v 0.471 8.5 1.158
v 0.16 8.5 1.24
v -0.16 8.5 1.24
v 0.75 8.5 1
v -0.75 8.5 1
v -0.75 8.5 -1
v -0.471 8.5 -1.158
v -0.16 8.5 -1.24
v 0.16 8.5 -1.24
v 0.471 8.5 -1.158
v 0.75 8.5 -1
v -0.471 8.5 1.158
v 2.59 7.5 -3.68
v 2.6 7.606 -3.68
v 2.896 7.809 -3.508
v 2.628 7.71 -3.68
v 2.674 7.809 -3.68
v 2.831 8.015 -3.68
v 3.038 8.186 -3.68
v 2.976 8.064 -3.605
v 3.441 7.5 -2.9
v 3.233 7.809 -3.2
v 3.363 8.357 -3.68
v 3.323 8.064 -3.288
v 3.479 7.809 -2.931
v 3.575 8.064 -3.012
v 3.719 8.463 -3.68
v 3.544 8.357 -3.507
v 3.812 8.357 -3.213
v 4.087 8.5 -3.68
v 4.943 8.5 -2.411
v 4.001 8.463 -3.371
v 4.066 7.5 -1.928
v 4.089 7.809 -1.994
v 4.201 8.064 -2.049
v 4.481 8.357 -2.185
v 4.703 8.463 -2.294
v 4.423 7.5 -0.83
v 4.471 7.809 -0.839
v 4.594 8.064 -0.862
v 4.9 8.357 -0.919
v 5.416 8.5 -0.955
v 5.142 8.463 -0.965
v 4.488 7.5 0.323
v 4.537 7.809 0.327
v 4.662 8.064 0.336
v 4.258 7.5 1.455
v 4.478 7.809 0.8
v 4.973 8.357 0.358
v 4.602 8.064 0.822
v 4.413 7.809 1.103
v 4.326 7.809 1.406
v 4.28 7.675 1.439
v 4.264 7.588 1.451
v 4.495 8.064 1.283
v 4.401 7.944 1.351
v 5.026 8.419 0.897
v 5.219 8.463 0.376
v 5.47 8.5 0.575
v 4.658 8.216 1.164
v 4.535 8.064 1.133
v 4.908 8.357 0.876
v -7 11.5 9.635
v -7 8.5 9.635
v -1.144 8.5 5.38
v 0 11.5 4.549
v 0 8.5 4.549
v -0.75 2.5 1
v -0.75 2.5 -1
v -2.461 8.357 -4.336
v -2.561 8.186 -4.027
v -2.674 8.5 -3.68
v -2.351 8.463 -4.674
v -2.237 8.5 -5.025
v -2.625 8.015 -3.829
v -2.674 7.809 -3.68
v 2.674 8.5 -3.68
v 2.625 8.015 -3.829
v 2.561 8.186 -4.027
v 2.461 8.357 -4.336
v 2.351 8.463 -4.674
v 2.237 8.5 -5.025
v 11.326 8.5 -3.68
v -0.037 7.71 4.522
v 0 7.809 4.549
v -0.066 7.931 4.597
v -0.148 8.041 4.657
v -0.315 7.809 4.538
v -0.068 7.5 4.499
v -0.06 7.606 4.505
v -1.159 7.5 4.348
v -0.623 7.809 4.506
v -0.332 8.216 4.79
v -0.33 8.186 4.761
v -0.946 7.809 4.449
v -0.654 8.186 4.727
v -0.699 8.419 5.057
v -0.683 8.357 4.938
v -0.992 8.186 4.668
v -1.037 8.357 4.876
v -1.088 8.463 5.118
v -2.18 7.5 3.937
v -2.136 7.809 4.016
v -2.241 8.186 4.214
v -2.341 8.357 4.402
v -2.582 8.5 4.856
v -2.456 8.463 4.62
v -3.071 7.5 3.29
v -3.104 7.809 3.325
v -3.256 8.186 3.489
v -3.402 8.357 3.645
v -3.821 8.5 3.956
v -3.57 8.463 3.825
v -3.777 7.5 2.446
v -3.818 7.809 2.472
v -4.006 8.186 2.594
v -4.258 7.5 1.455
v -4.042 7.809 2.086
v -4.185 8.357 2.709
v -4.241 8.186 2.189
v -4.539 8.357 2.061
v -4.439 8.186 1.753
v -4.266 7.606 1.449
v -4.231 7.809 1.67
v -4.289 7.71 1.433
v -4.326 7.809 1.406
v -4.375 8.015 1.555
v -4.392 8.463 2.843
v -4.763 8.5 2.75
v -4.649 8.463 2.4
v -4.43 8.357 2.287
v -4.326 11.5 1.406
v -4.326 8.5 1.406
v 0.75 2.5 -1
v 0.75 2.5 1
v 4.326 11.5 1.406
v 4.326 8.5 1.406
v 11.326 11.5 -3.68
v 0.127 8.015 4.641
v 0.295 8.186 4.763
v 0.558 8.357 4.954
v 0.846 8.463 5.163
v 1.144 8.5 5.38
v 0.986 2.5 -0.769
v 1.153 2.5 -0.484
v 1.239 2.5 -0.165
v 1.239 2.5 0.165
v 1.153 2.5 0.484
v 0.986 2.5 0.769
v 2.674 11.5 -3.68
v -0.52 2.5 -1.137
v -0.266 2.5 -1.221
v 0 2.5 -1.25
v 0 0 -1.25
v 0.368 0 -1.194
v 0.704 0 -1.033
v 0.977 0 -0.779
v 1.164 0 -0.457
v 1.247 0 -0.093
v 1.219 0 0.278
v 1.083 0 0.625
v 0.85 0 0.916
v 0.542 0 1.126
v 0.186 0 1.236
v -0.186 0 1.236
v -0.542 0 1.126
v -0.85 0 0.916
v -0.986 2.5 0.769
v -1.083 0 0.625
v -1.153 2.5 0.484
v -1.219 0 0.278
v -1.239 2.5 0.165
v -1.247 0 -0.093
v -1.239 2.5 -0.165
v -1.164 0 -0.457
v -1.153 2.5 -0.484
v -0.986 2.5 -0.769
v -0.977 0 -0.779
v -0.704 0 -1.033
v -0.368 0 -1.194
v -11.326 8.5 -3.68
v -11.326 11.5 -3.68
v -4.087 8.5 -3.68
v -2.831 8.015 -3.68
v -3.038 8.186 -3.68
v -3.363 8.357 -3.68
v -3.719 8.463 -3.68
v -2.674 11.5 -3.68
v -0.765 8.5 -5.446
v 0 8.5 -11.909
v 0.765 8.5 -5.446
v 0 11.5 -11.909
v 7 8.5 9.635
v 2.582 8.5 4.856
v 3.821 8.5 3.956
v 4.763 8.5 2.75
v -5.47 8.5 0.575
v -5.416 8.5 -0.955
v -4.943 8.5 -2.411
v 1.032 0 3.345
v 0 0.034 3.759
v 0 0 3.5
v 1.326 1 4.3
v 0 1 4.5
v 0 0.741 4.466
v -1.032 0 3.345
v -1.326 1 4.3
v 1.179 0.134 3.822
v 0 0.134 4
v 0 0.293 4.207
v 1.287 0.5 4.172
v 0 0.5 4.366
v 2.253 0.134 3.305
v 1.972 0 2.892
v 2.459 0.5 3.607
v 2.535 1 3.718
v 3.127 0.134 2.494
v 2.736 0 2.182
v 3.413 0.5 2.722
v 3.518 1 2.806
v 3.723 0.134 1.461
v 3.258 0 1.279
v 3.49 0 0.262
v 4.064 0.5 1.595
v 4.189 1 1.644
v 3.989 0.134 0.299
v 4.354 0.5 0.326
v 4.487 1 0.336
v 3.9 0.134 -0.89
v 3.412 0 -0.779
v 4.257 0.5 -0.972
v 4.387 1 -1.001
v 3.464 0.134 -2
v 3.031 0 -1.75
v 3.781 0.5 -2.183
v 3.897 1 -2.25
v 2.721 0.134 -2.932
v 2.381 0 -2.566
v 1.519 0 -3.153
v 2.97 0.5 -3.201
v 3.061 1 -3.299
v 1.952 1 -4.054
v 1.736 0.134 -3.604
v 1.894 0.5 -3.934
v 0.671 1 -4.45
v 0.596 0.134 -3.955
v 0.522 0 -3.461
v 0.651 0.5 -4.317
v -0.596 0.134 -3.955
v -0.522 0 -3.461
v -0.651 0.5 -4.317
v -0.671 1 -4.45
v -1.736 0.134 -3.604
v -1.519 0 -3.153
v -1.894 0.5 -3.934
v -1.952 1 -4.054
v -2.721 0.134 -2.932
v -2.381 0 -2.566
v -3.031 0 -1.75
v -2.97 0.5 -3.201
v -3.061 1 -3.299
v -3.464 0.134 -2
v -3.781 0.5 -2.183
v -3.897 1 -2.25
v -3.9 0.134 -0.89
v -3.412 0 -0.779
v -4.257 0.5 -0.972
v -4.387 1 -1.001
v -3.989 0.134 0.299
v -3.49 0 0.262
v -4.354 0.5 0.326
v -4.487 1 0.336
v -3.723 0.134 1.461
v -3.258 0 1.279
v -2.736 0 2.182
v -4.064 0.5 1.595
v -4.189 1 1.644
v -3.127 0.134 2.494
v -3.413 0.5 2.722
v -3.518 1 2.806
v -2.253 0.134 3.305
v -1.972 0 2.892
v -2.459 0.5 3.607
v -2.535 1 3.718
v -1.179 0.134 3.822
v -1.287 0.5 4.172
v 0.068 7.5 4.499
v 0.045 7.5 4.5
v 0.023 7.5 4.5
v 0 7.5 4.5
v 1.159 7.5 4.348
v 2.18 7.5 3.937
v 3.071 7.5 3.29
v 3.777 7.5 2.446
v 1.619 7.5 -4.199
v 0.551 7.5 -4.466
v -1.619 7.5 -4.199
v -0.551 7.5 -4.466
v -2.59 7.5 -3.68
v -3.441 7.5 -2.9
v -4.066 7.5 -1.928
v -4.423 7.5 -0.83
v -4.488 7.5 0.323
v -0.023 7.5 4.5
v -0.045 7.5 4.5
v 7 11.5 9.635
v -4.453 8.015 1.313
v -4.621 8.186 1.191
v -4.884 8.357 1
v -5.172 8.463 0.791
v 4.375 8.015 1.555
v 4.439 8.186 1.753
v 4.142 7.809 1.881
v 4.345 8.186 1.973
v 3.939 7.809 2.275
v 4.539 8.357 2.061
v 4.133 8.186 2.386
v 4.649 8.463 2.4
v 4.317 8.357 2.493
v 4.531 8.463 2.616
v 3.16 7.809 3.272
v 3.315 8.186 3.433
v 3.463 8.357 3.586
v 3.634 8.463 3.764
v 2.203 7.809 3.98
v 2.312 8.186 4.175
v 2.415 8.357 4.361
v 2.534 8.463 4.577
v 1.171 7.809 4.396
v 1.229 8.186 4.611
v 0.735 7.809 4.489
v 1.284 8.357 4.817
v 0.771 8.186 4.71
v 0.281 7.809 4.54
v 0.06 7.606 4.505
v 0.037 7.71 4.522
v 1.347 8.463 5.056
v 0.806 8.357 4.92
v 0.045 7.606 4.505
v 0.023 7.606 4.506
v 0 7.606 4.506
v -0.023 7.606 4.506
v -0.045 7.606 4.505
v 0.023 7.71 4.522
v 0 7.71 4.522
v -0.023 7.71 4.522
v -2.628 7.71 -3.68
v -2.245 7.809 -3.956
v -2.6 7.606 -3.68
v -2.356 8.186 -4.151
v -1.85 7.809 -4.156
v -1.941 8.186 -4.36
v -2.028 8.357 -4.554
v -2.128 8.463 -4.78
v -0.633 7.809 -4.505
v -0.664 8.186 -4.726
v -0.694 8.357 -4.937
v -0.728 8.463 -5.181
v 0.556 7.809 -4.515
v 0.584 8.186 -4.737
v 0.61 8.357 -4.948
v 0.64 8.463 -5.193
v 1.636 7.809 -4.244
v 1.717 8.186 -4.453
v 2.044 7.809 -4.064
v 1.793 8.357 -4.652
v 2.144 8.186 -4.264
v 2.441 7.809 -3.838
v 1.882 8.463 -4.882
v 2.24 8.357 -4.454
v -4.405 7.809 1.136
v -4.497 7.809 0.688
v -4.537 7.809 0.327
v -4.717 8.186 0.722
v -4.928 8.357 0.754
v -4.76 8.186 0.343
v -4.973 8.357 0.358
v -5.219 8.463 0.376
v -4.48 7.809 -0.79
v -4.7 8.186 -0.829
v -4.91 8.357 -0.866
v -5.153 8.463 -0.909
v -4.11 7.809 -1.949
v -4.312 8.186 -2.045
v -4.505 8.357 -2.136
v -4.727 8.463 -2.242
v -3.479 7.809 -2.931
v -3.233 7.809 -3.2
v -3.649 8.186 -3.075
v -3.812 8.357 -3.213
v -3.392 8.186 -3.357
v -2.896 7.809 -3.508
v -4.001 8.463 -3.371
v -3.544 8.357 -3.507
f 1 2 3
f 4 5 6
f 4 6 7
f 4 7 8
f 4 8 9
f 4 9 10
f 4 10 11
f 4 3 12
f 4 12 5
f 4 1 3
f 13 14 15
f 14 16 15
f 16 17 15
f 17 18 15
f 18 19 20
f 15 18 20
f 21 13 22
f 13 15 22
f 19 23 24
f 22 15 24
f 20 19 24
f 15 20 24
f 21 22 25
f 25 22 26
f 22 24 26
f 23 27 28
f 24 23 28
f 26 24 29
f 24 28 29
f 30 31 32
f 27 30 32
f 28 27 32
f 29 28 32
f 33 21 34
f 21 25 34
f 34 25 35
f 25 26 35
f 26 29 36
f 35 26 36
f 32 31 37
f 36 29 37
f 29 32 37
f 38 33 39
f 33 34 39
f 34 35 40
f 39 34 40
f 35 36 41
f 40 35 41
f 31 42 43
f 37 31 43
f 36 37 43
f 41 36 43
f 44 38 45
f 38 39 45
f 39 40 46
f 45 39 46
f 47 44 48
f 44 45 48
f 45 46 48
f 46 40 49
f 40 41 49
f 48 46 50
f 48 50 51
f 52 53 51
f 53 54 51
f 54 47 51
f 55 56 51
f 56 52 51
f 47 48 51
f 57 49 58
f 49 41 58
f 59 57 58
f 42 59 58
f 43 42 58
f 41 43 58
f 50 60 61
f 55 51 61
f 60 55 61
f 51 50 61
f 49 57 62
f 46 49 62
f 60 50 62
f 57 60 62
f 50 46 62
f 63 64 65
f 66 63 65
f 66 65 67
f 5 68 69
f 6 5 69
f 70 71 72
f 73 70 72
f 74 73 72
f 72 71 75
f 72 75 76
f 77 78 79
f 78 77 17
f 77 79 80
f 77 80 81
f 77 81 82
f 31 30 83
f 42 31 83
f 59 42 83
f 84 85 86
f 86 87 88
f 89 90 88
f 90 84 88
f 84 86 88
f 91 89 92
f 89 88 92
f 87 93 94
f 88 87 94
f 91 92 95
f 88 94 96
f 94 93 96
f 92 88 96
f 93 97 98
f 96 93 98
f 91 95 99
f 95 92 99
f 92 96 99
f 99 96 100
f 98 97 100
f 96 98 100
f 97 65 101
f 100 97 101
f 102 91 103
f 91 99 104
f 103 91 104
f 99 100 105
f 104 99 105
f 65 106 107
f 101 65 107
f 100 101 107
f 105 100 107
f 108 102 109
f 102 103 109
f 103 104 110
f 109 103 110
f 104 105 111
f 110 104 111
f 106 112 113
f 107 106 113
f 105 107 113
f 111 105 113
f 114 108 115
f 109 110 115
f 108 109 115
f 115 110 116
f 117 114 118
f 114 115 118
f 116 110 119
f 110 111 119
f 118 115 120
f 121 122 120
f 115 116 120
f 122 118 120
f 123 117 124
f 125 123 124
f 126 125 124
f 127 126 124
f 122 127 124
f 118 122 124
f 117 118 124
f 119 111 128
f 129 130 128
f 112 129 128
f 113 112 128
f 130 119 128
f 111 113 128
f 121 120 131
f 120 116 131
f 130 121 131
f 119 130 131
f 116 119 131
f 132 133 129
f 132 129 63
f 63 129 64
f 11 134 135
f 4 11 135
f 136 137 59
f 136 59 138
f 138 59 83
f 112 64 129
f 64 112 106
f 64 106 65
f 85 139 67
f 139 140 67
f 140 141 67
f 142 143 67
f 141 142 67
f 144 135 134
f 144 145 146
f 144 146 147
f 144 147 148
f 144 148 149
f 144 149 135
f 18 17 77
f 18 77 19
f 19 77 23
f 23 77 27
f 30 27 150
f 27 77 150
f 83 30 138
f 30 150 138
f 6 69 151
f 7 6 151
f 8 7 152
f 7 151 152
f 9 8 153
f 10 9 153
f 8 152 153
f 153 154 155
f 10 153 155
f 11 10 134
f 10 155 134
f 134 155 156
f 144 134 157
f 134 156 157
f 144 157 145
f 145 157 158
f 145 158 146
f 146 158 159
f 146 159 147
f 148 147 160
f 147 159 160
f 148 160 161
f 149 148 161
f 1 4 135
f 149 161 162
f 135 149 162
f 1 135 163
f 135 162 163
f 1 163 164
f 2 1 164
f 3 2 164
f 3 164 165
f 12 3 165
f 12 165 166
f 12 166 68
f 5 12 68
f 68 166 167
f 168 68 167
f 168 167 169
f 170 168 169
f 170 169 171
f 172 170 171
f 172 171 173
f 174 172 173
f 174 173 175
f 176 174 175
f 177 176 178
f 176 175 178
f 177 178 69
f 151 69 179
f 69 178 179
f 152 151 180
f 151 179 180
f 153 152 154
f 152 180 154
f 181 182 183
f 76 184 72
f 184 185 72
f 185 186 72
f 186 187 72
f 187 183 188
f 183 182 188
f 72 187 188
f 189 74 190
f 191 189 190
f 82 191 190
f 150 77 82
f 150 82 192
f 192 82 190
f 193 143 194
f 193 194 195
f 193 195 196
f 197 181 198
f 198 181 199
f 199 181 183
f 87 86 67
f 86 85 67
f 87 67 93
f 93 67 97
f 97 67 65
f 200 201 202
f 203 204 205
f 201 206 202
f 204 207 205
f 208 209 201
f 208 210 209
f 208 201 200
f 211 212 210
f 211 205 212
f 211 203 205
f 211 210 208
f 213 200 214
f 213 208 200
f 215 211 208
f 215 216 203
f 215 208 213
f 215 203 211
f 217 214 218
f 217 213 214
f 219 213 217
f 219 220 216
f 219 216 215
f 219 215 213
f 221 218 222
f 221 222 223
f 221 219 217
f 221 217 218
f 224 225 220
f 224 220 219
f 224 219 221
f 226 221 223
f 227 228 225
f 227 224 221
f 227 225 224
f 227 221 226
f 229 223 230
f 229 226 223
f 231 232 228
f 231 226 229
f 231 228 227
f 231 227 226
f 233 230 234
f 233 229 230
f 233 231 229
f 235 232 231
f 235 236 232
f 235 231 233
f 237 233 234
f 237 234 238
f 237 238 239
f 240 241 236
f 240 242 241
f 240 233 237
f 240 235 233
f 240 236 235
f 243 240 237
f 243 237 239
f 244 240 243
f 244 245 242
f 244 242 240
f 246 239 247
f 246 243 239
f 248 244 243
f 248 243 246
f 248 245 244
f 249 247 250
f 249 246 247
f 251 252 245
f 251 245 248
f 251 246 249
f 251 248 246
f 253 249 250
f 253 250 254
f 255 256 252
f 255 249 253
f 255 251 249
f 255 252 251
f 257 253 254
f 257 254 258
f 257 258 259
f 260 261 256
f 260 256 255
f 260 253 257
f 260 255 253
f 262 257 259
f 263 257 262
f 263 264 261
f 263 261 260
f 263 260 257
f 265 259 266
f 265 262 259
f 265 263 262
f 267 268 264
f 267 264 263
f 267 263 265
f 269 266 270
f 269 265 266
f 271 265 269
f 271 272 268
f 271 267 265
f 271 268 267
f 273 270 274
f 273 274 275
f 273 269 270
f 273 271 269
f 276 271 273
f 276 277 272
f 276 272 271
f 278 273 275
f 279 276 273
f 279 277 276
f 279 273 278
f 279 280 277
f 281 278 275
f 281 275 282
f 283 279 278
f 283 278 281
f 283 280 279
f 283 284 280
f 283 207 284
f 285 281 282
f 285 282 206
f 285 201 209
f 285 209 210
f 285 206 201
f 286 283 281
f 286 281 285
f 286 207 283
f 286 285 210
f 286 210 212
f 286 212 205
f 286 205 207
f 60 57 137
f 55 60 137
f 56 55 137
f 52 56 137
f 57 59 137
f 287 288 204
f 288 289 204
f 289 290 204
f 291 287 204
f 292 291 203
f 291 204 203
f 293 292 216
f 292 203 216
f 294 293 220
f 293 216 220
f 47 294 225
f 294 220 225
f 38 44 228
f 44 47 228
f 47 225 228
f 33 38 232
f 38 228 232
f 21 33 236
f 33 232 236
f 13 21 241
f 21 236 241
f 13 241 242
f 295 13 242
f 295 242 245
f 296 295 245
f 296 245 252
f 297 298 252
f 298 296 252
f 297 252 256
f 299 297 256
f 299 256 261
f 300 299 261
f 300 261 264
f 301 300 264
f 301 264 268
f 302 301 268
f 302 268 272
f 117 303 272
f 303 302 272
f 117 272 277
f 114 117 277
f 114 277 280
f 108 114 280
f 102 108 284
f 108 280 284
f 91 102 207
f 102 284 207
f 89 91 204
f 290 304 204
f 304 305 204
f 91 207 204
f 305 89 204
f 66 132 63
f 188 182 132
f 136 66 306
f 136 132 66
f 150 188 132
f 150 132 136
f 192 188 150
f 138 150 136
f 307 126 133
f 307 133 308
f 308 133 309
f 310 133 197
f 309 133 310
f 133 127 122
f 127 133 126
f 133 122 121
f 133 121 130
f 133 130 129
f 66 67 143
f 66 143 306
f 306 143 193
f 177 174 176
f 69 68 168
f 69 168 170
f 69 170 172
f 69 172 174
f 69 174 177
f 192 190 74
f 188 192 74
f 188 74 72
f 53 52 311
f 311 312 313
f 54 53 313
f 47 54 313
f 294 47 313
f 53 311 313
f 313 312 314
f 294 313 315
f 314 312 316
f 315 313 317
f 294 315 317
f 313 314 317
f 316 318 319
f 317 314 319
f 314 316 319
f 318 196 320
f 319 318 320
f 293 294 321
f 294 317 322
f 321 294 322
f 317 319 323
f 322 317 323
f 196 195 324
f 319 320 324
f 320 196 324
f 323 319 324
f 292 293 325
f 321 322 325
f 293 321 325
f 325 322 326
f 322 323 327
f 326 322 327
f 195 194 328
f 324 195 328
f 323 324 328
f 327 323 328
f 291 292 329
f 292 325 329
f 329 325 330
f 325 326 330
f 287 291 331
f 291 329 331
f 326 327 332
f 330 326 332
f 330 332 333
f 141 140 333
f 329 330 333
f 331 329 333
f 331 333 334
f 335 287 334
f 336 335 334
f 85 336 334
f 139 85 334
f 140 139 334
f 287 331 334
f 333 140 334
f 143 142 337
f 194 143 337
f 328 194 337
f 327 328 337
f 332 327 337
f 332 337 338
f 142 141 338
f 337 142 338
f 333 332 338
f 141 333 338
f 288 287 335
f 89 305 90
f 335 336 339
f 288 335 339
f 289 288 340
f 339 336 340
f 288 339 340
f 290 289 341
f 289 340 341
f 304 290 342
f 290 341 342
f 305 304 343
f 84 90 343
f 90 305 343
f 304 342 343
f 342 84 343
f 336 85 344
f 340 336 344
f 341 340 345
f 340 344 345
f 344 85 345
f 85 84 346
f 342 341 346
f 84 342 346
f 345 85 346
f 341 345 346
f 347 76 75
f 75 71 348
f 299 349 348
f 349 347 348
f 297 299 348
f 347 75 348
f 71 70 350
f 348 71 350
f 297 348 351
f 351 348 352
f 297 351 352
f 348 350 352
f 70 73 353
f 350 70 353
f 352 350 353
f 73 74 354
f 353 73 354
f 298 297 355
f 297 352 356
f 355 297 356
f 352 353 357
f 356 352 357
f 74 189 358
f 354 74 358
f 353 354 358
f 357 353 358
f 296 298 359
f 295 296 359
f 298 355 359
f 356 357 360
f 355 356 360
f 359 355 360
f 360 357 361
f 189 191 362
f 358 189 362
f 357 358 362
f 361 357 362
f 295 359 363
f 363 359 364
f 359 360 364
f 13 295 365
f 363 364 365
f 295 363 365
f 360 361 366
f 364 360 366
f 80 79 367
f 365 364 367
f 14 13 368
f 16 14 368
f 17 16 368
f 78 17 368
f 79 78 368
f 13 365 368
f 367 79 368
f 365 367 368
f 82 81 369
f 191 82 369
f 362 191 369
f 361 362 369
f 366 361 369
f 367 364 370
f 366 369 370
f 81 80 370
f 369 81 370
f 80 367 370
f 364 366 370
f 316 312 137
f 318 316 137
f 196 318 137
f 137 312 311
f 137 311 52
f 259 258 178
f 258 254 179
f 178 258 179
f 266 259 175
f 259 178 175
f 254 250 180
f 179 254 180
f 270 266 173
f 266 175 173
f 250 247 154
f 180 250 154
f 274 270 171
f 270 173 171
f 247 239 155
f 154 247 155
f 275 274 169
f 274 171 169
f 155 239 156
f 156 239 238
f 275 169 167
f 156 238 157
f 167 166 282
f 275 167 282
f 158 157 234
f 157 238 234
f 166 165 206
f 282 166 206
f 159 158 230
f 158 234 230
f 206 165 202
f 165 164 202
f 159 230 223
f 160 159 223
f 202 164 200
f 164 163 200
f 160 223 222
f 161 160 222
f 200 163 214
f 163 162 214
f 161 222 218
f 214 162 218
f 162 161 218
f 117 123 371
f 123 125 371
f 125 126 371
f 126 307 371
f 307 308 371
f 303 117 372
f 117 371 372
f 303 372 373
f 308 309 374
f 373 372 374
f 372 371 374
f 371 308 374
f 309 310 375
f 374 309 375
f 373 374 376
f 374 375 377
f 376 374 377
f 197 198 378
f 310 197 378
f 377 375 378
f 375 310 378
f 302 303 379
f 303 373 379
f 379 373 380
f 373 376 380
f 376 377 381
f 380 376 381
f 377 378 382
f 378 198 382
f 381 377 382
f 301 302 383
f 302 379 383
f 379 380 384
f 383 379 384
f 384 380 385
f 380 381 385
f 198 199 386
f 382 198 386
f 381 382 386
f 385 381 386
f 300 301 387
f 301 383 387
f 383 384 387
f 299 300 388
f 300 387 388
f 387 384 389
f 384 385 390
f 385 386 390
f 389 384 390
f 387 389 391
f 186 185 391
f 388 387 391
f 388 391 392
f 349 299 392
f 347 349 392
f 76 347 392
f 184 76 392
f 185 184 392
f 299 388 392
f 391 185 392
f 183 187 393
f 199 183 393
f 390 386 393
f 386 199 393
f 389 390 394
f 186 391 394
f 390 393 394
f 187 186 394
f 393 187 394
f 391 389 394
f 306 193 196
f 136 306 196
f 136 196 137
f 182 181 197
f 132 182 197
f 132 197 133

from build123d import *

# Parameters (mm, degrees)
SKETCH2_R                = 4.5
BOSS_EXTRUDE1_DEPTH      = 10
SKETCH4_R                = 1.25
CUT_EXTRUDE1_DEPTH       = 2.5
CUT_EXTRUDE4_DEPTH       = 6
BOSS_EXTRUDE7_DEPTH      = 1.5
BOSS_EXTRUDE7_DEPTH_BACK = 1.5
FILLET2_R                = 1


with BuildPart() as part:
    # Sketch2 → Boss-Extrude1 (new body)
    with BuildSketch(Plane(origin=(0, 0, 0), x_dir=(1, 0, 0), z_dir=(0, 1, 0))):
        with Locations(Location((0, 0, 0), (0, 0, 270))):
            Circle(SKETCH2_R)
    extrude(amount=BOSS_EXTRUDE1_DEPTH)

    # Sketch4 → Cut-Extrude1 (cut)
    with BuildSketch(Plane.XZ):
        with Locations(Location((0, 0, 0), (0, 0, 270))):
            Circle(SKETCH4_R)
    extrude(amount=-CUT_EXTRUDE1_DEPTH, mode=Mode.SUBTRACT)

    # Sketch5 → Cut-Extrude4 (cut)
    with BuildSketch(Plane.XZ.offset(-2.5)):
        with BuildLine():
            Line((-0.75, 1), (-0.75, -1))
            ThreePointArc((-0.75, -1), (0, -1.25), (0.75, -1))
            Line((0.75, -1), (0.75, 1))
            ThreePointArc((0.75, 1), (0, 1.25), (-0.75, 1))
        make_face()
    extrude(amount=-CUT_EXTRUDE4_DEPTH, mode=Mode.SUBTRACT)

    # Sketch3 → Boss-Extrude7 (add, two sides: drawn at the far end of the back side and taken through both)
    with BuildSketch(Plane(origin=(0, 10, 0), x_dir=(1, 0, 0), z_dir=(0, 1, 0)).offset(-BOSS_EXTRUDE7_DEPTH_BACK)):
        Polygon((0, 11.909111317), (-2.673762079, 3.680117785), (-11.326237921, 3.680117785), (-4.326237921, -1.405679911), (-7, -9.634673443), (0, -4.548875747), (7, -9.634673443), (4.326237921, -1.405679911), (11.326237921, 3.680117785), (2.673762079, 3.680117785), align=None)
    extrude(amount=BOSS_EXTRUDE7_DEPTH + BOSS_EXTRUDE7_DEPTH_BACK)

    # Fillet2
    # the kernel refuses this fillet: 1 mm, written as the material it adds along each edge
    with BuildSketch(Plane(origin=(0, 8.5, 0), x_dir=(0, 0, 1), z_dir=(1, 0, 0))) as fillet2_piece_1_section:
        with BuildLine():
            CenterArc((4.5 + FILLET2_R, FILLET2_R), FILLET2_R, 180, 90)
            Line((4.5 + FILLET2_R, 0), (4.5, 0))
            Line((4.5, 0), (4.5, FILLET2_R))
        make_face()
    fillet2_piece_1 = revolve(axis=Axis((0, 8.5, 0), (0, -1, 0)), mode=Mode.PRIVATE)
    fillet2_piece_1 = split(fillet2_piece_1, bisect_by=Plane(origin=(3e-09, 8.080053503, -3.680117785), z_dir=(0, 0, 1)), keep=Keep.TOP, mode=Mode.PRIVATE)
    fillet2_piece_1 = split(fillet2_piece_1, bisect_by=Plane(origin=(-0.015987158, 8.080053503, 4.537260397), z_dir=(0.587785252292471, 0, -0.8090169943749492)), keep=Keep.TOP, mode=Mode.PRIVATE)
    fillet2_piece_1 = split(fillet2_piece_1, bisect_by=Plane(origin=(0.015987161, 8.080053503, 4.537260395), z_dir=(-0.5877852522924681, 0, -0.8090169943749511)), keep=Keep.TOP, mode=Mode.PRIVATE)
    add(fillet2_piece_1)
    with BuildSketch(Plane(origin=(0, 8.5, 0), x_dir=(0, 0, 1), z_dir=(1, 0, 0))) as fillet2_piece_2_section:
        with BuildLine():
            CenterArc((4.5 + FILLET2_R, FILLET2_R), FILLET2_R, 180, 90)
            Line((4.5 + FILLET2_R, 0), (4.5, 0))
            Line((4.5, 0), (4.5, FILLET2_R))
        make_face()
    fillet2_piece_2 = revolve(axis=Axis((0, 8.5, 0), (0, -1, 0)), mode=Mode.PRIVATE)
    fillet2_piece_2 = split(fillet2_piece_2, bisect_by=Plane(origin=(-4.906405348, 8.214560611, 3.191251651), z_dir=(0.9510565162951518, 0, 0.30901699437495306)), keep=Keep.TOP, mode=Mode.PRIVATE)
    fillet2_piece_2 = split(fillet2_piece_2, bisect_by=Plane(origin=(4.369206305, 8.214560611, 1.537922999), z_dir=(-0.9510565162951523, 0, 0.30901699437495134)), keep=Keep.TOP, mode=Mode.PRIVATE)
    fillet2_piece_2 = split(fillet2_piece_2, bisect_by=Plane(origin=(-1.518898049, 8.214560611, 5.652419775), z_dir=(-0.5877852522924681, 0, -0.8090169943749511)), keep=Keep.TOP, mode=Mode.PRIVATE)
    add(fillet2_piece_2)
    with BuildSketch(Plane(origin=(0, 8.5, 0), x_dir=(0, 0, 1), z_dir=(1, 0, 0))) as fillet2_piece_3_section:
        with BuildLine():
            CenterArc((4.5 + FILLET2_R, FILLET2_R), FILLET2_R, 180, 90)
            Line((4.5 + FILLET2_R, 0), (4.5, 0))
            Line((4.5, 0), (4.5, FILLET2_R))
        make_face()
    fillet2_piece_3 = revolve(axis=Axis((0, 8.5, 0), (0, -1, 0)), mode=Mode.PRIVATE)
    fillet2_piece_3 = split(fillet2_piece_3, bisect_by=Plane(origin=(4.906405349, 8.214560608, 3.191251652), z_dir=(-0.9510565162951523, 0, 0.30901699437495134)), keep=Keep.TOP, mode=Mode.PRIVATE)
    fillet2_piece_3 = split(fillet2_piece_3, bisect_by=Plane(origin=(1.51889805, 8.214560608, 5.652419777), z_dir=(0.587785252292471, 0, -0.8090169943749492)), keep=Keep.TOP, mode=Mode.PRIVATE)
    fillet2_piece_3 = split(fillet2_piece_3, bisect_by=Plane(origin=(2.163118969, 8.214560608, 2.977277823), z_dir=(0.5877852522924681, 0, 0.8090169943749511)), keep=Keep.TOP, mode=Mode.PRIVATE)
    add(fillet2_piece_3)
    # the kernel refuses this fillet: 1 mm, written as the material it takes off along each edge
    with BuildSketch(Plane(origin=(0, 0, 0), x_dir=(0, 0, 1), z_dir=(-1, 0, 0))) as fillet2_2_piece_1:
        with BuildLine():
            CenterArc((4.5 - FILLET2_R, FILLET2_R), FILLET2_R, 270, 90)
            Line((4.5 - FILLET2_R, 0), (4.5, 0))
            Line((4.5, 0), (4.5, FILLET2_R))
        make_face()
    revolve(axis=Axis((0, 0, 0), (0, 1, 0)), mode=Mode.SUBTRACT)


solid = part.part
